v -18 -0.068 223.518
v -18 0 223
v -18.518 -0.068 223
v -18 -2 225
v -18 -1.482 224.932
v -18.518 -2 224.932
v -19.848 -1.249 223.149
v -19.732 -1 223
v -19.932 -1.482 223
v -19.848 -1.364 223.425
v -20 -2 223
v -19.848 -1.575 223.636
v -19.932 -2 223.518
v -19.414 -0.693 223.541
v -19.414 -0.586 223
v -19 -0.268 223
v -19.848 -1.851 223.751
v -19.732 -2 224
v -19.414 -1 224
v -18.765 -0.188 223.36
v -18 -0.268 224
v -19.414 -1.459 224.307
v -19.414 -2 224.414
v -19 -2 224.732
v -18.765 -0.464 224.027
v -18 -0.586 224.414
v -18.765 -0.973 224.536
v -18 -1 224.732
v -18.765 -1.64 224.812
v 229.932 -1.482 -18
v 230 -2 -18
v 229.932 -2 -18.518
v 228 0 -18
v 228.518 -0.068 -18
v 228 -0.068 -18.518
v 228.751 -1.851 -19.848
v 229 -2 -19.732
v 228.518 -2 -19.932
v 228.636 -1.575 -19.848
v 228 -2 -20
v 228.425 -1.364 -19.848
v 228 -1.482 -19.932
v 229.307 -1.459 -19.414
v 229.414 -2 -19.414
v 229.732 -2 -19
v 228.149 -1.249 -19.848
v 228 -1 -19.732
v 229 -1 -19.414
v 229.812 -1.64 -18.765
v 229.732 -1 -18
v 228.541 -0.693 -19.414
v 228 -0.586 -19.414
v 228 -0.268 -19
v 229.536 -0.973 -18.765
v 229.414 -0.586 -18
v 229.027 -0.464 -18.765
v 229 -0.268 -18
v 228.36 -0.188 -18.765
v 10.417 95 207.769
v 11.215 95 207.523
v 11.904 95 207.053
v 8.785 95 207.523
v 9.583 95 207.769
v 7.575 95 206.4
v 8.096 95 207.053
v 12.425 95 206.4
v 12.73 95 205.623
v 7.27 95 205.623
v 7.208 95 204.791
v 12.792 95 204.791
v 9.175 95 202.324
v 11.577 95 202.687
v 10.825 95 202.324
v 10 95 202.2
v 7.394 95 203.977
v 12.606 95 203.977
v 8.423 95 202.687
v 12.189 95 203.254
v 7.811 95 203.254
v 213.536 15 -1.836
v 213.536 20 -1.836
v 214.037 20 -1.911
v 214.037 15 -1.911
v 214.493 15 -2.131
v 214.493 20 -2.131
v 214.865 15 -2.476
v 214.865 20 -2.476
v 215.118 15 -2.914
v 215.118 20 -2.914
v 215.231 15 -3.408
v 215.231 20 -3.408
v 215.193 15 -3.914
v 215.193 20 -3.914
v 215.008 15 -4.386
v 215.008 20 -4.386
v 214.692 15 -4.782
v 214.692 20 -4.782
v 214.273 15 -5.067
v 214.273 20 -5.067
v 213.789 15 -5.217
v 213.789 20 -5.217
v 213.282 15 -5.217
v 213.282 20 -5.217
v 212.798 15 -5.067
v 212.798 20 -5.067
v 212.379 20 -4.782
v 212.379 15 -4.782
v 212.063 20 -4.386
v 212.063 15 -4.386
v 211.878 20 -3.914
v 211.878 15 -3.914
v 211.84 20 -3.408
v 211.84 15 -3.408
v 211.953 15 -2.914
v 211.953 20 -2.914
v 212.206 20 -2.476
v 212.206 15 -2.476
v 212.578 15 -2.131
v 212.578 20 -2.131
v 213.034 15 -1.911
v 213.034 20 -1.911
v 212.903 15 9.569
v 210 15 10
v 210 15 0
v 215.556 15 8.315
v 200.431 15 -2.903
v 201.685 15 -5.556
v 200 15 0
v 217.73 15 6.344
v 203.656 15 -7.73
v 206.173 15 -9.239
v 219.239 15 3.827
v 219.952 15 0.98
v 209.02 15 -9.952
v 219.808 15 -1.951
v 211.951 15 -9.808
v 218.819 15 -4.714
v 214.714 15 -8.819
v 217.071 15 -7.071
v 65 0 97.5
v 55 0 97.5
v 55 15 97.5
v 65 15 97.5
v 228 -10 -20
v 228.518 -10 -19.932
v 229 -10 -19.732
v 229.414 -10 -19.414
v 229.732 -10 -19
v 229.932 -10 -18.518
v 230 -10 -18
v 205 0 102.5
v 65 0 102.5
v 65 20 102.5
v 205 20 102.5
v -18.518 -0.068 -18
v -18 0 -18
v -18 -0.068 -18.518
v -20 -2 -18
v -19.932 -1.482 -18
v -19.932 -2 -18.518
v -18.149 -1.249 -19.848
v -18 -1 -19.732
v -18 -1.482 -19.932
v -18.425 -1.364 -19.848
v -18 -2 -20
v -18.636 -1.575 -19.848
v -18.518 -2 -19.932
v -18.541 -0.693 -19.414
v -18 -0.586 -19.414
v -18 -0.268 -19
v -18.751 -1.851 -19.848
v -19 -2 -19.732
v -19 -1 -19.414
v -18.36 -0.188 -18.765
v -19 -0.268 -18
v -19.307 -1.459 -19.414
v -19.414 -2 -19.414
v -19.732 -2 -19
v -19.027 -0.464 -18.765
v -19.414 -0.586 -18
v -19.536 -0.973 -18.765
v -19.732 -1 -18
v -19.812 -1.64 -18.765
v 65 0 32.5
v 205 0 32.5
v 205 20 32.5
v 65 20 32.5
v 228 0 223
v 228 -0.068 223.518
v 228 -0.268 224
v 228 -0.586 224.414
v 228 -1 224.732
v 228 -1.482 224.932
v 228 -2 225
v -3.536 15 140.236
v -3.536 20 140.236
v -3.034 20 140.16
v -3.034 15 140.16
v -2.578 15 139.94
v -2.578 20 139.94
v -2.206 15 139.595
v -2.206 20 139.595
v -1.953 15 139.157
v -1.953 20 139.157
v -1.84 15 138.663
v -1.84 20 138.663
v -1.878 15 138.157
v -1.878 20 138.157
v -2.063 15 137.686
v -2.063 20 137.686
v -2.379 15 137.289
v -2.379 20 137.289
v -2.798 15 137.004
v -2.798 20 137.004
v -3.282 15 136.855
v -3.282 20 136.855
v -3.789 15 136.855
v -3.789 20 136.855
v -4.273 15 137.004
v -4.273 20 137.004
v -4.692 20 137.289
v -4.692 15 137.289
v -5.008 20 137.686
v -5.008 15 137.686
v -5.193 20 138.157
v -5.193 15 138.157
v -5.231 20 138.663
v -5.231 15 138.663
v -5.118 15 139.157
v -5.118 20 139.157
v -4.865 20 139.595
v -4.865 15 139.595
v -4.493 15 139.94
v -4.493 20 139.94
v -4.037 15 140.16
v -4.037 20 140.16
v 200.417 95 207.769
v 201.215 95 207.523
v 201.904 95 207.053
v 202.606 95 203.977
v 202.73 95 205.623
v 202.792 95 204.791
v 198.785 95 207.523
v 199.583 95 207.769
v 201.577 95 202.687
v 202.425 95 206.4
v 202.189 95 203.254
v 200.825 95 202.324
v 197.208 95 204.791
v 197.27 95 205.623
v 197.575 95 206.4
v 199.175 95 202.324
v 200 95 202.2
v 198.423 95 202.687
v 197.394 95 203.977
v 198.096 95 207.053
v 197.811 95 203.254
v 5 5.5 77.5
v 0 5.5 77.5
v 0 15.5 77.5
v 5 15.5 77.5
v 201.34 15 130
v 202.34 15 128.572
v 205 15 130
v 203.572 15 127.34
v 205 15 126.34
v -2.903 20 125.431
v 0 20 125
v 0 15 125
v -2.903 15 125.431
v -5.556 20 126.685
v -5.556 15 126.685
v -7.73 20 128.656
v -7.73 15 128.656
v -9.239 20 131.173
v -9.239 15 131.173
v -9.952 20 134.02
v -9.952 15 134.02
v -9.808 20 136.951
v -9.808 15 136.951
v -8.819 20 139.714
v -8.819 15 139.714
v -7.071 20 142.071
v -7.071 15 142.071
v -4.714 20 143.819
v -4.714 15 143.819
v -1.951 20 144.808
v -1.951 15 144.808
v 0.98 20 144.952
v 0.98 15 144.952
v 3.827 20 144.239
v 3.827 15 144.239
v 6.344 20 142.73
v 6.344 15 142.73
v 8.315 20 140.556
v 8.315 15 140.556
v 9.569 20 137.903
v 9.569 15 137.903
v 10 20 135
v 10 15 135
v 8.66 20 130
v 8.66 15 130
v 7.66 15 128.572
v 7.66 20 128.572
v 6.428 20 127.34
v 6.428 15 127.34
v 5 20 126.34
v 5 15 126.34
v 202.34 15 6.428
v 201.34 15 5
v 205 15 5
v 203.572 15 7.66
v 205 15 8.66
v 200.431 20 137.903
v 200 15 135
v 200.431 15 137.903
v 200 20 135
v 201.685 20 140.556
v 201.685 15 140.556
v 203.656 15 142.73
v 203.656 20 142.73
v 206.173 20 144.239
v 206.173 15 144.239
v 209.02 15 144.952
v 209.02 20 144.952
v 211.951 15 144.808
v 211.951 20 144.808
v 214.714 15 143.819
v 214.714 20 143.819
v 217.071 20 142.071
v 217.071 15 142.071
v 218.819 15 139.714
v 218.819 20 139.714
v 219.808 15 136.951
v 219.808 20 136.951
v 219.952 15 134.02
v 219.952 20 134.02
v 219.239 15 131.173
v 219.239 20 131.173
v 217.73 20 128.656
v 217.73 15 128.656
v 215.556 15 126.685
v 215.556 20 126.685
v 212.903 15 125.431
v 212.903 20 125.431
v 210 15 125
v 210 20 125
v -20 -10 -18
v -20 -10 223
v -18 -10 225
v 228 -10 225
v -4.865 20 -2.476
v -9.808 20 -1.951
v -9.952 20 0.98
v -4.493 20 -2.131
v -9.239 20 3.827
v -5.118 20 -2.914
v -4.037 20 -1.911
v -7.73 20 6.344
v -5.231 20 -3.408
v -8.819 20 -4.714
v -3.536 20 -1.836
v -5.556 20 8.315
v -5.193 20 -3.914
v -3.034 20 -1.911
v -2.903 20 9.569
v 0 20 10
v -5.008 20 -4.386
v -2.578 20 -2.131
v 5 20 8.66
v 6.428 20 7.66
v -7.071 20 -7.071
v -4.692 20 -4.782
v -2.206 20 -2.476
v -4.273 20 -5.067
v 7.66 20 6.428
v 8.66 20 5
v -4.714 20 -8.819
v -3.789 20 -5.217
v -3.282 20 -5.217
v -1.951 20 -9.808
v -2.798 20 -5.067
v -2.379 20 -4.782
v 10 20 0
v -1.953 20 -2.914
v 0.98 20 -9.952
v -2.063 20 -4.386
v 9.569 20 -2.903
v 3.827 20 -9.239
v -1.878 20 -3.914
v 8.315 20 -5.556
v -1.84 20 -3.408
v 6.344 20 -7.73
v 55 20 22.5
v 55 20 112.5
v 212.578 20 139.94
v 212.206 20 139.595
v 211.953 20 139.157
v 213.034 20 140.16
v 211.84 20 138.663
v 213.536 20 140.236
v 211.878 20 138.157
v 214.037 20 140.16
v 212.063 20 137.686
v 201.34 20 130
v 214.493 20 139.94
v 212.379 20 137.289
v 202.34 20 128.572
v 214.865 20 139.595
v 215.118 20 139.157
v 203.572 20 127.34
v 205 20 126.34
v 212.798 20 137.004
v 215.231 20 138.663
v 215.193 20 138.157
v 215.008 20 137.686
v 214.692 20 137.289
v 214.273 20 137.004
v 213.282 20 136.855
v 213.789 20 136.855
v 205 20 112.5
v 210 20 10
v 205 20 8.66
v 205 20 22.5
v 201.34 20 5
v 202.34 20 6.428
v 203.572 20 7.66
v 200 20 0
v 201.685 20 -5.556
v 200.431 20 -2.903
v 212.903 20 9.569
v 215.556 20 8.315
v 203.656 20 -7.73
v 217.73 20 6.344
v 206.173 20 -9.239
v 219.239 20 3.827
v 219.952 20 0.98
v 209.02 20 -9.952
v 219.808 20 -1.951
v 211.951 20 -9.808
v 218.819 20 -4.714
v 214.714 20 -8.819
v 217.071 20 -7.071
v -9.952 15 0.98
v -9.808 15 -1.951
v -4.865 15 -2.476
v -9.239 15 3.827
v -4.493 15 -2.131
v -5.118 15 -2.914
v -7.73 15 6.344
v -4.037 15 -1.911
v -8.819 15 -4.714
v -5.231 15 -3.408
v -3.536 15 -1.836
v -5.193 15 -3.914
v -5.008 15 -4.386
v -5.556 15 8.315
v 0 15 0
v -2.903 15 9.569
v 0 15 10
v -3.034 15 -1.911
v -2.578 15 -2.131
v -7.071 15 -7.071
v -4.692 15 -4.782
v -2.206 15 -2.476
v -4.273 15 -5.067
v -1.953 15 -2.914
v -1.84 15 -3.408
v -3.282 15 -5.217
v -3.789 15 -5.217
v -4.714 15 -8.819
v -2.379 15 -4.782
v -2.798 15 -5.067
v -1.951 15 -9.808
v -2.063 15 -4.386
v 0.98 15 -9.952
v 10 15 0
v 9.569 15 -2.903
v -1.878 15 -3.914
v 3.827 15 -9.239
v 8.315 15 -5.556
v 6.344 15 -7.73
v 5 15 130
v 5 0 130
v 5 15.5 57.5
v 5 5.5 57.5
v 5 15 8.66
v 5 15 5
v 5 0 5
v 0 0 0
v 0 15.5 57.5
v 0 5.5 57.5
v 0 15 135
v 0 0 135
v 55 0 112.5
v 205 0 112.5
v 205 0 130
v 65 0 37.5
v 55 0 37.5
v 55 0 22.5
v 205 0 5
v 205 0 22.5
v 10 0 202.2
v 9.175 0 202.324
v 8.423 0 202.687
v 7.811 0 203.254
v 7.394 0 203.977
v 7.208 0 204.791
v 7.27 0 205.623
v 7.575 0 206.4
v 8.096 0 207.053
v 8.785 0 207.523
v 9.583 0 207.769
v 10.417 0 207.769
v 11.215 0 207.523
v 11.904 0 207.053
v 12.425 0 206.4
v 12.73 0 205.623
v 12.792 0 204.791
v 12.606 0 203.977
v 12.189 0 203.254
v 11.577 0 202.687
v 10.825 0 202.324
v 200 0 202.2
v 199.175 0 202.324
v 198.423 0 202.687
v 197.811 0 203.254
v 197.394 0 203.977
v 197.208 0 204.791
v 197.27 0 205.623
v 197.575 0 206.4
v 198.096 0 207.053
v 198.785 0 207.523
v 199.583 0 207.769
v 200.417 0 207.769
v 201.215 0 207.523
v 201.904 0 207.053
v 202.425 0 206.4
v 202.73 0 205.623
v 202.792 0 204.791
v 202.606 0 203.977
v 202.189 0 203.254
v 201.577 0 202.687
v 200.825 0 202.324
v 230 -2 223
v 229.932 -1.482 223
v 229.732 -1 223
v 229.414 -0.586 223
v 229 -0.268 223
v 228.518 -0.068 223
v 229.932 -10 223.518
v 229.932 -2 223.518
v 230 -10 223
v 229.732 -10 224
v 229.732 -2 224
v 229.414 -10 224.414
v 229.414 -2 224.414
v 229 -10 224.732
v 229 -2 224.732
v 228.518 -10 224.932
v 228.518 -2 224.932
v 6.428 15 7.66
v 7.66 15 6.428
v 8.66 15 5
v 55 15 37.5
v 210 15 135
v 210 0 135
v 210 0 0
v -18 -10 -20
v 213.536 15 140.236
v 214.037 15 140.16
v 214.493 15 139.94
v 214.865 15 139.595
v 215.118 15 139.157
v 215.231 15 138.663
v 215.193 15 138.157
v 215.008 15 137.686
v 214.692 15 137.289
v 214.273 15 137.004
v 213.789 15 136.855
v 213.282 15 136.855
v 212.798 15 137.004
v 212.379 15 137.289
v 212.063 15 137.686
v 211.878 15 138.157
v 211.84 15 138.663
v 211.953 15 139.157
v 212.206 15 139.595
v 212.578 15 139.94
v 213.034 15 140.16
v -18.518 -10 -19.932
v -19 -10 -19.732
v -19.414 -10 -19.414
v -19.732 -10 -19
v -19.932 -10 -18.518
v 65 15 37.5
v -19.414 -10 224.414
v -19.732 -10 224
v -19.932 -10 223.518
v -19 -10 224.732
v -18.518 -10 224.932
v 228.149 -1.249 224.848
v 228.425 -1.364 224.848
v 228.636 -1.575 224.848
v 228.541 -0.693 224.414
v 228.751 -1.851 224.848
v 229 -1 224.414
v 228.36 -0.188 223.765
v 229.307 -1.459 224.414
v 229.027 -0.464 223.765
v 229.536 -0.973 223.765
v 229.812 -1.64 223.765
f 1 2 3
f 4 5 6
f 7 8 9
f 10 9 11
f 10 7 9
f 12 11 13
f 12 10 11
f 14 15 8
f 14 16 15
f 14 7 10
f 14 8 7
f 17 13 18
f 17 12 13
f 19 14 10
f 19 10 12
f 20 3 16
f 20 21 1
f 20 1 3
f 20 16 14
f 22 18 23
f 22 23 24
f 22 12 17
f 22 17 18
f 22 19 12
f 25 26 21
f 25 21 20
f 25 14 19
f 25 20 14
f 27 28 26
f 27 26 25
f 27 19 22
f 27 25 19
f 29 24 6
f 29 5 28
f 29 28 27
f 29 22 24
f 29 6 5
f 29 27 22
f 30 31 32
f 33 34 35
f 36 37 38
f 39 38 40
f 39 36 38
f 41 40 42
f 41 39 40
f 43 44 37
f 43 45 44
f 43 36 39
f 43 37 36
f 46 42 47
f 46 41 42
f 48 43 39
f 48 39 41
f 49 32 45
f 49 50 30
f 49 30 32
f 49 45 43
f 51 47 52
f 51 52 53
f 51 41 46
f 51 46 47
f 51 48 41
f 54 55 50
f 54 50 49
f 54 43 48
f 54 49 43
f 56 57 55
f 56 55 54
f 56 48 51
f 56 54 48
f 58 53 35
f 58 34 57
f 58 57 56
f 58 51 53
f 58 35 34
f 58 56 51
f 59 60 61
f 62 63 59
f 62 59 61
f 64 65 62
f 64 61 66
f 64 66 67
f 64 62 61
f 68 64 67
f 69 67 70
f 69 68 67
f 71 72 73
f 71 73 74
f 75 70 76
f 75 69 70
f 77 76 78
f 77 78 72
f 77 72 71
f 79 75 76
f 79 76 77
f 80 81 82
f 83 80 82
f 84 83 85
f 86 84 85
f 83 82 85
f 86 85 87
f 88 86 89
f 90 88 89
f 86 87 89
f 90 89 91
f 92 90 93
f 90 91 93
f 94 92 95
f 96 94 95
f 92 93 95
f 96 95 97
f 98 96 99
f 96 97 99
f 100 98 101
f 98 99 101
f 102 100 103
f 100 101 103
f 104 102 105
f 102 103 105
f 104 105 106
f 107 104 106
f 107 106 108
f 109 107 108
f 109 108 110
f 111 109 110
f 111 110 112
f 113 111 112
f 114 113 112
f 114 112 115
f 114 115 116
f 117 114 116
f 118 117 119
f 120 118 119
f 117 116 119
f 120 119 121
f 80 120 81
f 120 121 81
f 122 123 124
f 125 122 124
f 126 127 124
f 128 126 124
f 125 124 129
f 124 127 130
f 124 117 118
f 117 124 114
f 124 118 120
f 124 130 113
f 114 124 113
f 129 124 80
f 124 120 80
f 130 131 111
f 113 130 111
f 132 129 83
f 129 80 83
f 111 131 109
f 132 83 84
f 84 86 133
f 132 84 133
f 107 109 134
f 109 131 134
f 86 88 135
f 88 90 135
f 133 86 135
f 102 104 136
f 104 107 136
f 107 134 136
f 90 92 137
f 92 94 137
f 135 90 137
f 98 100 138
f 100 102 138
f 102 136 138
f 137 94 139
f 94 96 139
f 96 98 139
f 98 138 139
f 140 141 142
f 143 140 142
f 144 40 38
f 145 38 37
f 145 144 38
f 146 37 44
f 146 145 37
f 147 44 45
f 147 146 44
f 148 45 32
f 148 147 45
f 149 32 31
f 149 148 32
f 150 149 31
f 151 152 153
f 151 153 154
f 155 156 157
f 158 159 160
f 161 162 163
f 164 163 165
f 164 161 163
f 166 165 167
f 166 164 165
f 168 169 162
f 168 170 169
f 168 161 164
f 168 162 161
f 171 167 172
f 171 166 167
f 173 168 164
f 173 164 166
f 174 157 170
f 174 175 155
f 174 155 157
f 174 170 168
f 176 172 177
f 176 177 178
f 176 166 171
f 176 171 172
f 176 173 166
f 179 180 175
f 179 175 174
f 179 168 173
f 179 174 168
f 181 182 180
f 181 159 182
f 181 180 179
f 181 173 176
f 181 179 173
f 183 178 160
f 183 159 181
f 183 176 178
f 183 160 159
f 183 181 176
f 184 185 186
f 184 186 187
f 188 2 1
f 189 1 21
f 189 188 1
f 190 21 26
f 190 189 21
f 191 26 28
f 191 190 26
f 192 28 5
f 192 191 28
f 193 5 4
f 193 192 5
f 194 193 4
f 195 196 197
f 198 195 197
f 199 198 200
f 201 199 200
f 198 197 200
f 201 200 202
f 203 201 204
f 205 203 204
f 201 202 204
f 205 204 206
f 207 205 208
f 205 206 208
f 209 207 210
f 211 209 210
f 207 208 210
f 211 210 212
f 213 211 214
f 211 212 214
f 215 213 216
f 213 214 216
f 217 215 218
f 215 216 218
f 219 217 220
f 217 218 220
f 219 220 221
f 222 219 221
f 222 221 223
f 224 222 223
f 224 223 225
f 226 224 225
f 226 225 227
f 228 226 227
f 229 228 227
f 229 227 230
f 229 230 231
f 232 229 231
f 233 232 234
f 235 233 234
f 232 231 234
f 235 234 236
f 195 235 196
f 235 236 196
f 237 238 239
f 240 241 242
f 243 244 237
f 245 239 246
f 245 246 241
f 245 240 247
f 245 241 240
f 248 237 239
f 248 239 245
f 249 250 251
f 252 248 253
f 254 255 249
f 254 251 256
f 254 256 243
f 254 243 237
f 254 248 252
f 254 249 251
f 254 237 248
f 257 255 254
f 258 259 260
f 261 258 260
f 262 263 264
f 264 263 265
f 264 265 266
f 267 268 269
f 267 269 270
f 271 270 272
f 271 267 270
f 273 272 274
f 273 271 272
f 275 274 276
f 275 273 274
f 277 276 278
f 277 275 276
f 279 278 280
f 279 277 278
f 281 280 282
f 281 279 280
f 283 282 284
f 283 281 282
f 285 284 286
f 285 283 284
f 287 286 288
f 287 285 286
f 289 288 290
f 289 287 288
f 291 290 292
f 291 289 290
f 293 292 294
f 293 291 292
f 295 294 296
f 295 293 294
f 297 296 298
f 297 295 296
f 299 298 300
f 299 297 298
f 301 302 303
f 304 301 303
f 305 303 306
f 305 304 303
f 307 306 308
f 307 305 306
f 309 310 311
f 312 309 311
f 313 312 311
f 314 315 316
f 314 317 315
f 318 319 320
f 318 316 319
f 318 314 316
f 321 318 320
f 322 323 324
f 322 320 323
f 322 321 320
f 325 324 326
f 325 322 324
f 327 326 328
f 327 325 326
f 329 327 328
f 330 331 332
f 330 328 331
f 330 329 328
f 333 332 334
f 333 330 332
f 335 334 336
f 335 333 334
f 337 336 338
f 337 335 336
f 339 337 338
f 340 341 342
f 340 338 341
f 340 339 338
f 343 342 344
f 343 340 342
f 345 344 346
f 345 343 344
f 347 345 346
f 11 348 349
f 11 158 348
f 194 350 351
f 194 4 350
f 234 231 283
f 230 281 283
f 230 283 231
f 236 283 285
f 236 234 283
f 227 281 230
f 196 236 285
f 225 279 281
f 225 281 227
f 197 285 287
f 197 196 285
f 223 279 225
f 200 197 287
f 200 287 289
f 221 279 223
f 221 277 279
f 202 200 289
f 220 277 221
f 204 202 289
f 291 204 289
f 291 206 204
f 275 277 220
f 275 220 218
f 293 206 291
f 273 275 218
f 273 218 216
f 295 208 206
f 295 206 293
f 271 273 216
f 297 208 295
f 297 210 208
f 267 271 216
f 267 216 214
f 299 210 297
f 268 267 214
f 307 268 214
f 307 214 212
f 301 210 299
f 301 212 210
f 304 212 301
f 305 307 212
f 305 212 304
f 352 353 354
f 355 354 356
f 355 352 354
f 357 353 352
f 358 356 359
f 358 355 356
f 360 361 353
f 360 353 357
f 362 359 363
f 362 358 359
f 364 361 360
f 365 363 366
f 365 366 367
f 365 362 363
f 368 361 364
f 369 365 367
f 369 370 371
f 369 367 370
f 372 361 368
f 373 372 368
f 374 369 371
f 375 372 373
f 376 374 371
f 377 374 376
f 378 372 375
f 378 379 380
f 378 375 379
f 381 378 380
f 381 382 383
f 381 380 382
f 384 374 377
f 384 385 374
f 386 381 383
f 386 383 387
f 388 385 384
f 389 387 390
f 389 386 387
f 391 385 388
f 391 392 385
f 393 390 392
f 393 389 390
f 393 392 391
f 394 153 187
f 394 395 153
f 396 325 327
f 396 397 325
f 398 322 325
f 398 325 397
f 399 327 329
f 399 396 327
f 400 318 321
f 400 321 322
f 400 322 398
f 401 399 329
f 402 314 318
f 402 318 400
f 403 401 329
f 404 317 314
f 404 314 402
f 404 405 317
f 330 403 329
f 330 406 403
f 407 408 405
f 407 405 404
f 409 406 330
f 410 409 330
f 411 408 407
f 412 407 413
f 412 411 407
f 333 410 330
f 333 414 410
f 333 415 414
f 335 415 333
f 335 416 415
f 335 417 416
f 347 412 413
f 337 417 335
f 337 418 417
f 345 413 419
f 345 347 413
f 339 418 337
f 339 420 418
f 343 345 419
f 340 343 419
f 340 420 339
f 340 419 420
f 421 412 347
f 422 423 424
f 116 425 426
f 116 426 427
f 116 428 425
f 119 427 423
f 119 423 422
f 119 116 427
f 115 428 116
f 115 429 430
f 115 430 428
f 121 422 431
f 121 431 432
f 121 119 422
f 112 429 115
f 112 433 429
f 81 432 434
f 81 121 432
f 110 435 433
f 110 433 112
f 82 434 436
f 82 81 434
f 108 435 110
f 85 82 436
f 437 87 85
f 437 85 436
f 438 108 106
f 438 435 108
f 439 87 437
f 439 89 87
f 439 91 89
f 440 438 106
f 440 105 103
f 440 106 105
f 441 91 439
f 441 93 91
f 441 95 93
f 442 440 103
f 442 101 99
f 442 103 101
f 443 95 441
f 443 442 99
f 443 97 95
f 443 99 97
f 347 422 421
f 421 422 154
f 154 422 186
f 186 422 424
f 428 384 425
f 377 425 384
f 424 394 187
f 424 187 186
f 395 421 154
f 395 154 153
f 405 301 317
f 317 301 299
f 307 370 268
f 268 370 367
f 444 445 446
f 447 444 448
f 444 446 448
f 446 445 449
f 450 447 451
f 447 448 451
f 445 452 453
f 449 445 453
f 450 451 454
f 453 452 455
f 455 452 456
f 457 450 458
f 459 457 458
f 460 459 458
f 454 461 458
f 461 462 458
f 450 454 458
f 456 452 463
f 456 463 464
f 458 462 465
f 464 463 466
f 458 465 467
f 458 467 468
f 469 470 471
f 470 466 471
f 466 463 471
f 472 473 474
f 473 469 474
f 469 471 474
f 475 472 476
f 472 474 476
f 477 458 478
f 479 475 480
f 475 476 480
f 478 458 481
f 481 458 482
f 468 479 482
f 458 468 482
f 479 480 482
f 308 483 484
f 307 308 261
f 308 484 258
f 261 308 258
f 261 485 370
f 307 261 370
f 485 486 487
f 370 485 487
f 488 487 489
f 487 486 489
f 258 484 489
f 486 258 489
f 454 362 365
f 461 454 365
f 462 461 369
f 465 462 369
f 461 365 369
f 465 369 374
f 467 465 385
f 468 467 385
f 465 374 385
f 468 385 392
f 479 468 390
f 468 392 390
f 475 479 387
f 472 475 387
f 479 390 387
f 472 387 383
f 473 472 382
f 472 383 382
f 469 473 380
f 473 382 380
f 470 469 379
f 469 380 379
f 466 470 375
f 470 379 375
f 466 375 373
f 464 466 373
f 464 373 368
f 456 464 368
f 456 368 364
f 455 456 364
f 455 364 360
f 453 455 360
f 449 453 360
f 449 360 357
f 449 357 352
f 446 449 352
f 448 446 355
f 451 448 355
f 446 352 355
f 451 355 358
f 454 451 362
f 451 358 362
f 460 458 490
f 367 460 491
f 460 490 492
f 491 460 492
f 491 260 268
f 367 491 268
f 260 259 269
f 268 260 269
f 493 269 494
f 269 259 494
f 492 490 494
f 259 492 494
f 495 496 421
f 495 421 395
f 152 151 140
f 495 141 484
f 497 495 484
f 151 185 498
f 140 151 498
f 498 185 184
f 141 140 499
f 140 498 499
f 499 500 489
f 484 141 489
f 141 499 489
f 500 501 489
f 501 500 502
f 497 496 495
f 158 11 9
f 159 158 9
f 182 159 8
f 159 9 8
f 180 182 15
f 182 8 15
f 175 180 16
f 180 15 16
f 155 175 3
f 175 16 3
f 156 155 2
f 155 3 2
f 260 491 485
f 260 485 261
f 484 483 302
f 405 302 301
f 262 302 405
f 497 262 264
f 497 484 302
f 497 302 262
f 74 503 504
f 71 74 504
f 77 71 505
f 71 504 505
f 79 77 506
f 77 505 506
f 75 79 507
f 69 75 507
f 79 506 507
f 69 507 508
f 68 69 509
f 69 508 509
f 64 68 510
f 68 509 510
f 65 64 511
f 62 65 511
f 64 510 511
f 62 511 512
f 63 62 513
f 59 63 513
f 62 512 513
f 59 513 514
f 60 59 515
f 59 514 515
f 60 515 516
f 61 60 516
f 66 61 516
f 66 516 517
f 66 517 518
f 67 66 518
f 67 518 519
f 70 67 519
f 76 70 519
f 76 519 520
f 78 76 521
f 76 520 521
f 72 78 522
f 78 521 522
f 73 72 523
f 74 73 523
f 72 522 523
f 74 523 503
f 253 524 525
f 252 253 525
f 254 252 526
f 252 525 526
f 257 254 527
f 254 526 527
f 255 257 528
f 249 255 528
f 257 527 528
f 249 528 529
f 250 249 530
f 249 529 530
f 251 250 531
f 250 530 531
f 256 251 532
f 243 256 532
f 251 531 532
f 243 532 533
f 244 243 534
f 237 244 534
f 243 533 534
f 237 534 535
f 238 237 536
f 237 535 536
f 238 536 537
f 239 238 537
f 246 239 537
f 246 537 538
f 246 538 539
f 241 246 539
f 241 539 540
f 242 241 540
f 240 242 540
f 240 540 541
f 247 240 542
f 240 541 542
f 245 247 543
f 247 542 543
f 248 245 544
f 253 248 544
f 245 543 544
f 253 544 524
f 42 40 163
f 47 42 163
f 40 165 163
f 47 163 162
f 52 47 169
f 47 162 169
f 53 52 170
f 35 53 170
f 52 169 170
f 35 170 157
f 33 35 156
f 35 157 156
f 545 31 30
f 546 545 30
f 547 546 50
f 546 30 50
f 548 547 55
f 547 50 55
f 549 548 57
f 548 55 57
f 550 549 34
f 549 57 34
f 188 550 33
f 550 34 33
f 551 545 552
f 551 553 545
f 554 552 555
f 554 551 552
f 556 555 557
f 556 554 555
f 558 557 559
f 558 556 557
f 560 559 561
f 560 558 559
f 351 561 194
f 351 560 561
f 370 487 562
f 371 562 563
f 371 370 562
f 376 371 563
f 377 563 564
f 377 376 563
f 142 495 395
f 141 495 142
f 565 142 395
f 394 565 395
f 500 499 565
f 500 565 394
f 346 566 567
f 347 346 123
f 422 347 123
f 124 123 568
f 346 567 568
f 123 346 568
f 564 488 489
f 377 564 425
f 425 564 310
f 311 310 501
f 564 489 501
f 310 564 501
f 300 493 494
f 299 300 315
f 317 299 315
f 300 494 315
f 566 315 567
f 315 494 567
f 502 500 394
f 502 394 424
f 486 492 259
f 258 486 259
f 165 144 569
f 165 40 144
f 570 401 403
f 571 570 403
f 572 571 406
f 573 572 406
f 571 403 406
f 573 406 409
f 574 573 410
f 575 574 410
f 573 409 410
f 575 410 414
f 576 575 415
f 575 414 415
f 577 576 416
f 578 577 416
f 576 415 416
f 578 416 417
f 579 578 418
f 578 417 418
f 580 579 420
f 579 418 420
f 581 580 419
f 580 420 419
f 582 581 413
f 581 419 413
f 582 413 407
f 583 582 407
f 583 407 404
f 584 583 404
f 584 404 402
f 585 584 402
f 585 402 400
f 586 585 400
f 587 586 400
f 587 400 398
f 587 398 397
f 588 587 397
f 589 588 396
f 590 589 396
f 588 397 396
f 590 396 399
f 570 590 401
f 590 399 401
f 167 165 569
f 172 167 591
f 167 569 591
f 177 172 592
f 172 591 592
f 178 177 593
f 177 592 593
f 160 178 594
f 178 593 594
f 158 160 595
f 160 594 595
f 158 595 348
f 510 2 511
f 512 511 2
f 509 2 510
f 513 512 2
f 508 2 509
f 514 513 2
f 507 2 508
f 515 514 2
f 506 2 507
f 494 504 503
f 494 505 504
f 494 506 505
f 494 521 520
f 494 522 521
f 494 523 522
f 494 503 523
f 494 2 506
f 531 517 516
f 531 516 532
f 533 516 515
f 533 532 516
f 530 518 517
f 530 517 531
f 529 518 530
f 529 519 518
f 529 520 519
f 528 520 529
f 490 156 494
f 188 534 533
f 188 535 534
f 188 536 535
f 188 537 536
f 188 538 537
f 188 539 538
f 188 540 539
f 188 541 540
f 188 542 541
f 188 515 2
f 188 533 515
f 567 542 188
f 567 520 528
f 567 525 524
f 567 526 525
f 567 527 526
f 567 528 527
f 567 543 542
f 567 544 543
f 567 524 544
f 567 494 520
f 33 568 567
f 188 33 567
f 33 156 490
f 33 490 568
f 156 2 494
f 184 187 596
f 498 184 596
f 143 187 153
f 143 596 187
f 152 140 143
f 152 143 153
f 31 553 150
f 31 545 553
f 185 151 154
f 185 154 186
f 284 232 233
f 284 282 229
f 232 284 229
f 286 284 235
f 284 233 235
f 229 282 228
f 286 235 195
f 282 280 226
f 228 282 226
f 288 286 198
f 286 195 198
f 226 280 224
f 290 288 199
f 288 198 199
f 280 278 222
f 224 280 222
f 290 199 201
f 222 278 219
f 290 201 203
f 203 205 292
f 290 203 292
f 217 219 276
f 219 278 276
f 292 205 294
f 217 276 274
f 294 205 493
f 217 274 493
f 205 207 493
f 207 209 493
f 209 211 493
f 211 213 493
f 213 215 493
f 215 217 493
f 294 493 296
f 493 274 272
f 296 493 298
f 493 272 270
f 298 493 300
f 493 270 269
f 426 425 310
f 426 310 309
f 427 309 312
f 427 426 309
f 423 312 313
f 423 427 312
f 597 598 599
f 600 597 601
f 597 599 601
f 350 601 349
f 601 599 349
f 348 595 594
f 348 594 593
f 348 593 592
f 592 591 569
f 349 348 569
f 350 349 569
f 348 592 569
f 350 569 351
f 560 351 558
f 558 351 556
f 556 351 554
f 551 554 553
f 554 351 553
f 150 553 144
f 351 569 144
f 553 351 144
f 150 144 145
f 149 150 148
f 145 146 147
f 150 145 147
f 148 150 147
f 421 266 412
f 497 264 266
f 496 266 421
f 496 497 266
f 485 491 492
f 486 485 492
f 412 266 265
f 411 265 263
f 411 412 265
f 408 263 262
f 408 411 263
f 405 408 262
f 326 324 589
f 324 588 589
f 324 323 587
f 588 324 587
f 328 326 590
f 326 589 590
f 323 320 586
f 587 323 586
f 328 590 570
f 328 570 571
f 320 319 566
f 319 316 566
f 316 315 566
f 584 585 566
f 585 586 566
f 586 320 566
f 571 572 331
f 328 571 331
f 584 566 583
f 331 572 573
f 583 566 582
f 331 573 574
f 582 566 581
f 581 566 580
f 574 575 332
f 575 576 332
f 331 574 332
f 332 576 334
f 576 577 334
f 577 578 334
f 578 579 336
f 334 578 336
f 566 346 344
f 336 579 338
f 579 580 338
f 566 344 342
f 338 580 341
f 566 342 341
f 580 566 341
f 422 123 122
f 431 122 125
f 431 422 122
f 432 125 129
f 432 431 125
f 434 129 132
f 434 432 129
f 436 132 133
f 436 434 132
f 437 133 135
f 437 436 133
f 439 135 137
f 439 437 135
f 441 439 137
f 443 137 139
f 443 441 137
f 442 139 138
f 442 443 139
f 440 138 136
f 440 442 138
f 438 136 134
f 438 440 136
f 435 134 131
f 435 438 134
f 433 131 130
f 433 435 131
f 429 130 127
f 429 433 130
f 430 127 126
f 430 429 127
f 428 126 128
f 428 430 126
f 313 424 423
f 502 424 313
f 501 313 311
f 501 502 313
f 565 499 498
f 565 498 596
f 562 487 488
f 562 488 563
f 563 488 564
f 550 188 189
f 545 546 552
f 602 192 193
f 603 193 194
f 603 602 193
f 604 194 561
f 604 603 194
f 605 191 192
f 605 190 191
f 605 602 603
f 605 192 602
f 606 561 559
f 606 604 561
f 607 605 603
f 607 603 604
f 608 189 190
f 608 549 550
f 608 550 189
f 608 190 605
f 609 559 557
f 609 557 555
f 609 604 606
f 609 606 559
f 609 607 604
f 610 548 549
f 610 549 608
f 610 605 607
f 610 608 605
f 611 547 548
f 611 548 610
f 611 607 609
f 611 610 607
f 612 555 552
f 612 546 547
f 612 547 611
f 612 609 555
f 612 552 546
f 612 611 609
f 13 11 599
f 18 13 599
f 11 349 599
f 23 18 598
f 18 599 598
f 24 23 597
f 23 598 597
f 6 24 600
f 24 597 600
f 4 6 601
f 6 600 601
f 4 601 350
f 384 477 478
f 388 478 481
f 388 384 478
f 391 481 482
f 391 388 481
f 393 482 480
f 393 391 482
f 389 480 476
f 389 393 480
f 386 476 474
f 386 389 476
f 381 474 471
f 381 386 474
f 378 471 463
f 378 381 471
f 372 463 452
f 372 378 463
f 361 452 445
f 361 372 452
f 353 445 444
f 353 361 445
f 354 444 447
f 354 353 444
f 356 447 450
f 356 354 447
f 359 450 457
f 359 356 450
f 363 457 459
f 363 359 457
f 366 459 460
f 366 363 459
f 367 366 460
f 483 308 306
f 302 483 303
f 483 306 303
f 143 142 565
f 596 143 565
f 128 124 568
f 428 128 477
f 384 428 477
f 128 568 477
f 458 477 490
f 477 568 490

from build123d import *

# Parameters (mm, degrees)
SKETCH1_W           = 200
SKETCH1_H           = 125
BOSS_EXTRUDE3_DEPTH = 40
BOSS_EXTRUDE4_DEPTH = 10
EXTRUDE_THIN1_DEPTH = 40
SKETCH5_W           = 30
SKETCH5_H           = 15
CUT_EXTRUDE2_DEPTH  = 40
SKETCH6_W           = 210
SKETCH6_H           = 135
CUT_EXTRUDE3_DEPTH  = 20
SKETCH7_R           = 10
BOSS_EXTRUDE5_DEPTH = 5
SKETCH8_R           = 1.7
CUT_EXTRUDE5_DEPTH  = 5
SKETCH9_W           = 10
SKETCH9_H           = 5
CUT_EXTRUDE6_DEPTH  = 10
SKETCH10_W          = 230
SKETCH10_H          = 155
BOSS_EXTRUDE6_DEPTH = 10
SKETCH14_R          = 2.8
BOSS_EXTRUDE7_DEPTH = 95
FILLET1_R           = 2


with BuildPart() as part:
    # Sketch1 → Boss-Extrude3 (new body)
    with BuildSketch(Plane(origin=(0, 0, 0), x_dir=(1, 0, 0), z_dir=(0, 1, 0))):
        Polygon((5, 0), (0, 0), (0, -135), (210, -135), (210, 0), align=None)
        with Locations((105, -67.5)):
            Rectangle(SKETCH1_W, SKETCH1_H, mode=Mode.SUBTRACT)
    extrude(amount=BOSS_EXTRUDE3_DEPTH)

    # Sketch3 → Boss-Extrude4 (add)
    with BuildSketch(Plane(origin=(0, 0, 0), x_dir=(-1, 0, 0), z_dir=(0, -1, 0))):
        Polygon((-220, -145), (0, -145), (10, -145), (10, 10), (-220, 10), align=None)
    extrude(amount=BOSS_EXTRUDE4_DEPTH)

    # Sketch4 → Extrude-Thin1 (add)
    with BuildSketch(Plane(origin=(0, 0, 0), x_dir=(1, 0, 0), z_dir=(0, 1, 0))):
        Polygon((205, -32.5), (65, -32.5), (65, -102.5), (205, -102.5), (205, -112.5), (55, -112.5), (55, -22.5), (205, -22.5), align=None)
    extrude(amount=EXTRUDE_THIN1_DEPTH)

    # Sketch5 → Cut-Extrude2 (cut)
    with BuildSketch(Plane.ZY.offset(-55)):
        with Locations((82.5, 7.5)):
            Rectangle(SKETCH5_W, SKETCH5_H)
        with Locations((52.5, 7.5)):
            Rectangle(SKETCH5_W, SKETCH5_H)
    extrude(amount=-CUT_EXTRUDE2_DEPTH, mode=Mode.SUBTRACT)

    # Sketch6 → Cut-Extrude3 (cut)
    with BuildSketch(Plane(origin=(0, 40, 0), x_dir=(1, 0, 0), z_dir=(0, 1, 0))):
        with Locations((105, -67.5)):
            Rectangle(SKETCH6_W, SKETCH6_H)
    extrude(amount=-CUT_EXTRUDE3_DEPTH, mode=Mode.SUBTRACT)

    # Sketch7 → Boss-Extrude5 (add)
    with BuildSketch(Plane(origin=(0, 20, 0), x_dir=(1, 0, 0), z_dir=(0, 1, 0))):
        Circle(SKETCH7_R)
        with Locations((210, 0)):
            Circle(SKETCH7_R)
        with Locations((210, -135)):
            Circle(SKETCH7_R)
        with Locations((0, -135)):
            Circle(SKETCH7_R)
    extrude(amount=-BOSS_EXTRUDE5_DEPTH)

    # Sketch8 → Cut-Extrude5 (cut)
    with BuildSketch(Plane(origin=(0, 20, 0), x_dir=(1, 0, 0), z_dir=(0, 1, 0))):
        with Locations(Location((-3.535533906, 3.535533906, 0), (0, 0, 270))):
            Circle(SKETCH8_R)
        with Locations(Location((213.535533906, 3.535533906, 0), (0, 0, 270))):
            Circle(SKETCH8_R)
        with Locations(Location((213.535533906, -138.535533906, 0), (0, 0, 270))):
            Circle(SKETCH8_R)
        with Locations(Location((-3.535533906, -138.535533906, 0), (0, 0, 270))):
            Circle(SKETCH8_R)
    extrude(amount=-CUT_EXTRUDE5_DEPTH, mode=Mode.SUBTRACT)

    # Sketch9 → Cut-Extrude6 (cut)
    with BuildSketch(Plane.ZY):
        Polygon((77.5, 15.5), (77.5, 10.5), (67.5, 10.5), (57.5, 10.5), (57.5, 15.5), align=None)
        with Locations((72.5, 8)):
            Rectangle(SKETCH9_W, SKETCH9_H)
        with Locations((62.5, 8)):
            Rectangle(SKETCH9_W, SKETCH9_H)
    extrude(amount=-CUT_EXTRUDE6_DEPTH, mode=Mode.SUBTRACT)

    # Sketch10 → Boss-Extrude6 (add)
    with BuildSketch(Plane(origin=(0, 0, 0), x_dir=(1, 0, 0), z_dir=(0, 1, 0))):
        Polygon((230, 20), (-10, 20), (-20, 20), (-20, -225), (230, -225), align=None)
        with Locations((105, -67.5)):
            Rectangle(SKETCH10_W, SKETCH10_H, mode=Mode.SUBTRACT)
    extrude(amount=-BOSS_EXTRUDE6_DEPTH)

    # Sketch14 → Boss-Extrude7 (add)
    with BuildSketch(Plane(origin=(0, 0, 0), x_dir=(1, 0, 0), z_dir=(0, 1, 0))):
        with Locations(Location((10, -205, 0), (0, 0, 90))):
            Circle(SKETCH14_R)
        with Locations(Location((200, -205, 0), (0, 0, 90))):
            Circle(SKETCH14_R)
    extrude(amount=BOSS_EXTRUDE7_DEPTH)

    # Fillet1
    fillet1_edges = [part.edges().sort_by_distance(p)[0] for p in [
        (230, 0, 102.5),
        (230, -5, -20),
        (105, 0, 225),
        (230, -5, 225),
        (-20, 0, 102.5),
        (-20, -5, 225),
        (105, 0, -20),
        (-20, -5, -20),
    ]]
    fillet(fillet1_edges, radius=FILLET1_R)


solid = part.part
